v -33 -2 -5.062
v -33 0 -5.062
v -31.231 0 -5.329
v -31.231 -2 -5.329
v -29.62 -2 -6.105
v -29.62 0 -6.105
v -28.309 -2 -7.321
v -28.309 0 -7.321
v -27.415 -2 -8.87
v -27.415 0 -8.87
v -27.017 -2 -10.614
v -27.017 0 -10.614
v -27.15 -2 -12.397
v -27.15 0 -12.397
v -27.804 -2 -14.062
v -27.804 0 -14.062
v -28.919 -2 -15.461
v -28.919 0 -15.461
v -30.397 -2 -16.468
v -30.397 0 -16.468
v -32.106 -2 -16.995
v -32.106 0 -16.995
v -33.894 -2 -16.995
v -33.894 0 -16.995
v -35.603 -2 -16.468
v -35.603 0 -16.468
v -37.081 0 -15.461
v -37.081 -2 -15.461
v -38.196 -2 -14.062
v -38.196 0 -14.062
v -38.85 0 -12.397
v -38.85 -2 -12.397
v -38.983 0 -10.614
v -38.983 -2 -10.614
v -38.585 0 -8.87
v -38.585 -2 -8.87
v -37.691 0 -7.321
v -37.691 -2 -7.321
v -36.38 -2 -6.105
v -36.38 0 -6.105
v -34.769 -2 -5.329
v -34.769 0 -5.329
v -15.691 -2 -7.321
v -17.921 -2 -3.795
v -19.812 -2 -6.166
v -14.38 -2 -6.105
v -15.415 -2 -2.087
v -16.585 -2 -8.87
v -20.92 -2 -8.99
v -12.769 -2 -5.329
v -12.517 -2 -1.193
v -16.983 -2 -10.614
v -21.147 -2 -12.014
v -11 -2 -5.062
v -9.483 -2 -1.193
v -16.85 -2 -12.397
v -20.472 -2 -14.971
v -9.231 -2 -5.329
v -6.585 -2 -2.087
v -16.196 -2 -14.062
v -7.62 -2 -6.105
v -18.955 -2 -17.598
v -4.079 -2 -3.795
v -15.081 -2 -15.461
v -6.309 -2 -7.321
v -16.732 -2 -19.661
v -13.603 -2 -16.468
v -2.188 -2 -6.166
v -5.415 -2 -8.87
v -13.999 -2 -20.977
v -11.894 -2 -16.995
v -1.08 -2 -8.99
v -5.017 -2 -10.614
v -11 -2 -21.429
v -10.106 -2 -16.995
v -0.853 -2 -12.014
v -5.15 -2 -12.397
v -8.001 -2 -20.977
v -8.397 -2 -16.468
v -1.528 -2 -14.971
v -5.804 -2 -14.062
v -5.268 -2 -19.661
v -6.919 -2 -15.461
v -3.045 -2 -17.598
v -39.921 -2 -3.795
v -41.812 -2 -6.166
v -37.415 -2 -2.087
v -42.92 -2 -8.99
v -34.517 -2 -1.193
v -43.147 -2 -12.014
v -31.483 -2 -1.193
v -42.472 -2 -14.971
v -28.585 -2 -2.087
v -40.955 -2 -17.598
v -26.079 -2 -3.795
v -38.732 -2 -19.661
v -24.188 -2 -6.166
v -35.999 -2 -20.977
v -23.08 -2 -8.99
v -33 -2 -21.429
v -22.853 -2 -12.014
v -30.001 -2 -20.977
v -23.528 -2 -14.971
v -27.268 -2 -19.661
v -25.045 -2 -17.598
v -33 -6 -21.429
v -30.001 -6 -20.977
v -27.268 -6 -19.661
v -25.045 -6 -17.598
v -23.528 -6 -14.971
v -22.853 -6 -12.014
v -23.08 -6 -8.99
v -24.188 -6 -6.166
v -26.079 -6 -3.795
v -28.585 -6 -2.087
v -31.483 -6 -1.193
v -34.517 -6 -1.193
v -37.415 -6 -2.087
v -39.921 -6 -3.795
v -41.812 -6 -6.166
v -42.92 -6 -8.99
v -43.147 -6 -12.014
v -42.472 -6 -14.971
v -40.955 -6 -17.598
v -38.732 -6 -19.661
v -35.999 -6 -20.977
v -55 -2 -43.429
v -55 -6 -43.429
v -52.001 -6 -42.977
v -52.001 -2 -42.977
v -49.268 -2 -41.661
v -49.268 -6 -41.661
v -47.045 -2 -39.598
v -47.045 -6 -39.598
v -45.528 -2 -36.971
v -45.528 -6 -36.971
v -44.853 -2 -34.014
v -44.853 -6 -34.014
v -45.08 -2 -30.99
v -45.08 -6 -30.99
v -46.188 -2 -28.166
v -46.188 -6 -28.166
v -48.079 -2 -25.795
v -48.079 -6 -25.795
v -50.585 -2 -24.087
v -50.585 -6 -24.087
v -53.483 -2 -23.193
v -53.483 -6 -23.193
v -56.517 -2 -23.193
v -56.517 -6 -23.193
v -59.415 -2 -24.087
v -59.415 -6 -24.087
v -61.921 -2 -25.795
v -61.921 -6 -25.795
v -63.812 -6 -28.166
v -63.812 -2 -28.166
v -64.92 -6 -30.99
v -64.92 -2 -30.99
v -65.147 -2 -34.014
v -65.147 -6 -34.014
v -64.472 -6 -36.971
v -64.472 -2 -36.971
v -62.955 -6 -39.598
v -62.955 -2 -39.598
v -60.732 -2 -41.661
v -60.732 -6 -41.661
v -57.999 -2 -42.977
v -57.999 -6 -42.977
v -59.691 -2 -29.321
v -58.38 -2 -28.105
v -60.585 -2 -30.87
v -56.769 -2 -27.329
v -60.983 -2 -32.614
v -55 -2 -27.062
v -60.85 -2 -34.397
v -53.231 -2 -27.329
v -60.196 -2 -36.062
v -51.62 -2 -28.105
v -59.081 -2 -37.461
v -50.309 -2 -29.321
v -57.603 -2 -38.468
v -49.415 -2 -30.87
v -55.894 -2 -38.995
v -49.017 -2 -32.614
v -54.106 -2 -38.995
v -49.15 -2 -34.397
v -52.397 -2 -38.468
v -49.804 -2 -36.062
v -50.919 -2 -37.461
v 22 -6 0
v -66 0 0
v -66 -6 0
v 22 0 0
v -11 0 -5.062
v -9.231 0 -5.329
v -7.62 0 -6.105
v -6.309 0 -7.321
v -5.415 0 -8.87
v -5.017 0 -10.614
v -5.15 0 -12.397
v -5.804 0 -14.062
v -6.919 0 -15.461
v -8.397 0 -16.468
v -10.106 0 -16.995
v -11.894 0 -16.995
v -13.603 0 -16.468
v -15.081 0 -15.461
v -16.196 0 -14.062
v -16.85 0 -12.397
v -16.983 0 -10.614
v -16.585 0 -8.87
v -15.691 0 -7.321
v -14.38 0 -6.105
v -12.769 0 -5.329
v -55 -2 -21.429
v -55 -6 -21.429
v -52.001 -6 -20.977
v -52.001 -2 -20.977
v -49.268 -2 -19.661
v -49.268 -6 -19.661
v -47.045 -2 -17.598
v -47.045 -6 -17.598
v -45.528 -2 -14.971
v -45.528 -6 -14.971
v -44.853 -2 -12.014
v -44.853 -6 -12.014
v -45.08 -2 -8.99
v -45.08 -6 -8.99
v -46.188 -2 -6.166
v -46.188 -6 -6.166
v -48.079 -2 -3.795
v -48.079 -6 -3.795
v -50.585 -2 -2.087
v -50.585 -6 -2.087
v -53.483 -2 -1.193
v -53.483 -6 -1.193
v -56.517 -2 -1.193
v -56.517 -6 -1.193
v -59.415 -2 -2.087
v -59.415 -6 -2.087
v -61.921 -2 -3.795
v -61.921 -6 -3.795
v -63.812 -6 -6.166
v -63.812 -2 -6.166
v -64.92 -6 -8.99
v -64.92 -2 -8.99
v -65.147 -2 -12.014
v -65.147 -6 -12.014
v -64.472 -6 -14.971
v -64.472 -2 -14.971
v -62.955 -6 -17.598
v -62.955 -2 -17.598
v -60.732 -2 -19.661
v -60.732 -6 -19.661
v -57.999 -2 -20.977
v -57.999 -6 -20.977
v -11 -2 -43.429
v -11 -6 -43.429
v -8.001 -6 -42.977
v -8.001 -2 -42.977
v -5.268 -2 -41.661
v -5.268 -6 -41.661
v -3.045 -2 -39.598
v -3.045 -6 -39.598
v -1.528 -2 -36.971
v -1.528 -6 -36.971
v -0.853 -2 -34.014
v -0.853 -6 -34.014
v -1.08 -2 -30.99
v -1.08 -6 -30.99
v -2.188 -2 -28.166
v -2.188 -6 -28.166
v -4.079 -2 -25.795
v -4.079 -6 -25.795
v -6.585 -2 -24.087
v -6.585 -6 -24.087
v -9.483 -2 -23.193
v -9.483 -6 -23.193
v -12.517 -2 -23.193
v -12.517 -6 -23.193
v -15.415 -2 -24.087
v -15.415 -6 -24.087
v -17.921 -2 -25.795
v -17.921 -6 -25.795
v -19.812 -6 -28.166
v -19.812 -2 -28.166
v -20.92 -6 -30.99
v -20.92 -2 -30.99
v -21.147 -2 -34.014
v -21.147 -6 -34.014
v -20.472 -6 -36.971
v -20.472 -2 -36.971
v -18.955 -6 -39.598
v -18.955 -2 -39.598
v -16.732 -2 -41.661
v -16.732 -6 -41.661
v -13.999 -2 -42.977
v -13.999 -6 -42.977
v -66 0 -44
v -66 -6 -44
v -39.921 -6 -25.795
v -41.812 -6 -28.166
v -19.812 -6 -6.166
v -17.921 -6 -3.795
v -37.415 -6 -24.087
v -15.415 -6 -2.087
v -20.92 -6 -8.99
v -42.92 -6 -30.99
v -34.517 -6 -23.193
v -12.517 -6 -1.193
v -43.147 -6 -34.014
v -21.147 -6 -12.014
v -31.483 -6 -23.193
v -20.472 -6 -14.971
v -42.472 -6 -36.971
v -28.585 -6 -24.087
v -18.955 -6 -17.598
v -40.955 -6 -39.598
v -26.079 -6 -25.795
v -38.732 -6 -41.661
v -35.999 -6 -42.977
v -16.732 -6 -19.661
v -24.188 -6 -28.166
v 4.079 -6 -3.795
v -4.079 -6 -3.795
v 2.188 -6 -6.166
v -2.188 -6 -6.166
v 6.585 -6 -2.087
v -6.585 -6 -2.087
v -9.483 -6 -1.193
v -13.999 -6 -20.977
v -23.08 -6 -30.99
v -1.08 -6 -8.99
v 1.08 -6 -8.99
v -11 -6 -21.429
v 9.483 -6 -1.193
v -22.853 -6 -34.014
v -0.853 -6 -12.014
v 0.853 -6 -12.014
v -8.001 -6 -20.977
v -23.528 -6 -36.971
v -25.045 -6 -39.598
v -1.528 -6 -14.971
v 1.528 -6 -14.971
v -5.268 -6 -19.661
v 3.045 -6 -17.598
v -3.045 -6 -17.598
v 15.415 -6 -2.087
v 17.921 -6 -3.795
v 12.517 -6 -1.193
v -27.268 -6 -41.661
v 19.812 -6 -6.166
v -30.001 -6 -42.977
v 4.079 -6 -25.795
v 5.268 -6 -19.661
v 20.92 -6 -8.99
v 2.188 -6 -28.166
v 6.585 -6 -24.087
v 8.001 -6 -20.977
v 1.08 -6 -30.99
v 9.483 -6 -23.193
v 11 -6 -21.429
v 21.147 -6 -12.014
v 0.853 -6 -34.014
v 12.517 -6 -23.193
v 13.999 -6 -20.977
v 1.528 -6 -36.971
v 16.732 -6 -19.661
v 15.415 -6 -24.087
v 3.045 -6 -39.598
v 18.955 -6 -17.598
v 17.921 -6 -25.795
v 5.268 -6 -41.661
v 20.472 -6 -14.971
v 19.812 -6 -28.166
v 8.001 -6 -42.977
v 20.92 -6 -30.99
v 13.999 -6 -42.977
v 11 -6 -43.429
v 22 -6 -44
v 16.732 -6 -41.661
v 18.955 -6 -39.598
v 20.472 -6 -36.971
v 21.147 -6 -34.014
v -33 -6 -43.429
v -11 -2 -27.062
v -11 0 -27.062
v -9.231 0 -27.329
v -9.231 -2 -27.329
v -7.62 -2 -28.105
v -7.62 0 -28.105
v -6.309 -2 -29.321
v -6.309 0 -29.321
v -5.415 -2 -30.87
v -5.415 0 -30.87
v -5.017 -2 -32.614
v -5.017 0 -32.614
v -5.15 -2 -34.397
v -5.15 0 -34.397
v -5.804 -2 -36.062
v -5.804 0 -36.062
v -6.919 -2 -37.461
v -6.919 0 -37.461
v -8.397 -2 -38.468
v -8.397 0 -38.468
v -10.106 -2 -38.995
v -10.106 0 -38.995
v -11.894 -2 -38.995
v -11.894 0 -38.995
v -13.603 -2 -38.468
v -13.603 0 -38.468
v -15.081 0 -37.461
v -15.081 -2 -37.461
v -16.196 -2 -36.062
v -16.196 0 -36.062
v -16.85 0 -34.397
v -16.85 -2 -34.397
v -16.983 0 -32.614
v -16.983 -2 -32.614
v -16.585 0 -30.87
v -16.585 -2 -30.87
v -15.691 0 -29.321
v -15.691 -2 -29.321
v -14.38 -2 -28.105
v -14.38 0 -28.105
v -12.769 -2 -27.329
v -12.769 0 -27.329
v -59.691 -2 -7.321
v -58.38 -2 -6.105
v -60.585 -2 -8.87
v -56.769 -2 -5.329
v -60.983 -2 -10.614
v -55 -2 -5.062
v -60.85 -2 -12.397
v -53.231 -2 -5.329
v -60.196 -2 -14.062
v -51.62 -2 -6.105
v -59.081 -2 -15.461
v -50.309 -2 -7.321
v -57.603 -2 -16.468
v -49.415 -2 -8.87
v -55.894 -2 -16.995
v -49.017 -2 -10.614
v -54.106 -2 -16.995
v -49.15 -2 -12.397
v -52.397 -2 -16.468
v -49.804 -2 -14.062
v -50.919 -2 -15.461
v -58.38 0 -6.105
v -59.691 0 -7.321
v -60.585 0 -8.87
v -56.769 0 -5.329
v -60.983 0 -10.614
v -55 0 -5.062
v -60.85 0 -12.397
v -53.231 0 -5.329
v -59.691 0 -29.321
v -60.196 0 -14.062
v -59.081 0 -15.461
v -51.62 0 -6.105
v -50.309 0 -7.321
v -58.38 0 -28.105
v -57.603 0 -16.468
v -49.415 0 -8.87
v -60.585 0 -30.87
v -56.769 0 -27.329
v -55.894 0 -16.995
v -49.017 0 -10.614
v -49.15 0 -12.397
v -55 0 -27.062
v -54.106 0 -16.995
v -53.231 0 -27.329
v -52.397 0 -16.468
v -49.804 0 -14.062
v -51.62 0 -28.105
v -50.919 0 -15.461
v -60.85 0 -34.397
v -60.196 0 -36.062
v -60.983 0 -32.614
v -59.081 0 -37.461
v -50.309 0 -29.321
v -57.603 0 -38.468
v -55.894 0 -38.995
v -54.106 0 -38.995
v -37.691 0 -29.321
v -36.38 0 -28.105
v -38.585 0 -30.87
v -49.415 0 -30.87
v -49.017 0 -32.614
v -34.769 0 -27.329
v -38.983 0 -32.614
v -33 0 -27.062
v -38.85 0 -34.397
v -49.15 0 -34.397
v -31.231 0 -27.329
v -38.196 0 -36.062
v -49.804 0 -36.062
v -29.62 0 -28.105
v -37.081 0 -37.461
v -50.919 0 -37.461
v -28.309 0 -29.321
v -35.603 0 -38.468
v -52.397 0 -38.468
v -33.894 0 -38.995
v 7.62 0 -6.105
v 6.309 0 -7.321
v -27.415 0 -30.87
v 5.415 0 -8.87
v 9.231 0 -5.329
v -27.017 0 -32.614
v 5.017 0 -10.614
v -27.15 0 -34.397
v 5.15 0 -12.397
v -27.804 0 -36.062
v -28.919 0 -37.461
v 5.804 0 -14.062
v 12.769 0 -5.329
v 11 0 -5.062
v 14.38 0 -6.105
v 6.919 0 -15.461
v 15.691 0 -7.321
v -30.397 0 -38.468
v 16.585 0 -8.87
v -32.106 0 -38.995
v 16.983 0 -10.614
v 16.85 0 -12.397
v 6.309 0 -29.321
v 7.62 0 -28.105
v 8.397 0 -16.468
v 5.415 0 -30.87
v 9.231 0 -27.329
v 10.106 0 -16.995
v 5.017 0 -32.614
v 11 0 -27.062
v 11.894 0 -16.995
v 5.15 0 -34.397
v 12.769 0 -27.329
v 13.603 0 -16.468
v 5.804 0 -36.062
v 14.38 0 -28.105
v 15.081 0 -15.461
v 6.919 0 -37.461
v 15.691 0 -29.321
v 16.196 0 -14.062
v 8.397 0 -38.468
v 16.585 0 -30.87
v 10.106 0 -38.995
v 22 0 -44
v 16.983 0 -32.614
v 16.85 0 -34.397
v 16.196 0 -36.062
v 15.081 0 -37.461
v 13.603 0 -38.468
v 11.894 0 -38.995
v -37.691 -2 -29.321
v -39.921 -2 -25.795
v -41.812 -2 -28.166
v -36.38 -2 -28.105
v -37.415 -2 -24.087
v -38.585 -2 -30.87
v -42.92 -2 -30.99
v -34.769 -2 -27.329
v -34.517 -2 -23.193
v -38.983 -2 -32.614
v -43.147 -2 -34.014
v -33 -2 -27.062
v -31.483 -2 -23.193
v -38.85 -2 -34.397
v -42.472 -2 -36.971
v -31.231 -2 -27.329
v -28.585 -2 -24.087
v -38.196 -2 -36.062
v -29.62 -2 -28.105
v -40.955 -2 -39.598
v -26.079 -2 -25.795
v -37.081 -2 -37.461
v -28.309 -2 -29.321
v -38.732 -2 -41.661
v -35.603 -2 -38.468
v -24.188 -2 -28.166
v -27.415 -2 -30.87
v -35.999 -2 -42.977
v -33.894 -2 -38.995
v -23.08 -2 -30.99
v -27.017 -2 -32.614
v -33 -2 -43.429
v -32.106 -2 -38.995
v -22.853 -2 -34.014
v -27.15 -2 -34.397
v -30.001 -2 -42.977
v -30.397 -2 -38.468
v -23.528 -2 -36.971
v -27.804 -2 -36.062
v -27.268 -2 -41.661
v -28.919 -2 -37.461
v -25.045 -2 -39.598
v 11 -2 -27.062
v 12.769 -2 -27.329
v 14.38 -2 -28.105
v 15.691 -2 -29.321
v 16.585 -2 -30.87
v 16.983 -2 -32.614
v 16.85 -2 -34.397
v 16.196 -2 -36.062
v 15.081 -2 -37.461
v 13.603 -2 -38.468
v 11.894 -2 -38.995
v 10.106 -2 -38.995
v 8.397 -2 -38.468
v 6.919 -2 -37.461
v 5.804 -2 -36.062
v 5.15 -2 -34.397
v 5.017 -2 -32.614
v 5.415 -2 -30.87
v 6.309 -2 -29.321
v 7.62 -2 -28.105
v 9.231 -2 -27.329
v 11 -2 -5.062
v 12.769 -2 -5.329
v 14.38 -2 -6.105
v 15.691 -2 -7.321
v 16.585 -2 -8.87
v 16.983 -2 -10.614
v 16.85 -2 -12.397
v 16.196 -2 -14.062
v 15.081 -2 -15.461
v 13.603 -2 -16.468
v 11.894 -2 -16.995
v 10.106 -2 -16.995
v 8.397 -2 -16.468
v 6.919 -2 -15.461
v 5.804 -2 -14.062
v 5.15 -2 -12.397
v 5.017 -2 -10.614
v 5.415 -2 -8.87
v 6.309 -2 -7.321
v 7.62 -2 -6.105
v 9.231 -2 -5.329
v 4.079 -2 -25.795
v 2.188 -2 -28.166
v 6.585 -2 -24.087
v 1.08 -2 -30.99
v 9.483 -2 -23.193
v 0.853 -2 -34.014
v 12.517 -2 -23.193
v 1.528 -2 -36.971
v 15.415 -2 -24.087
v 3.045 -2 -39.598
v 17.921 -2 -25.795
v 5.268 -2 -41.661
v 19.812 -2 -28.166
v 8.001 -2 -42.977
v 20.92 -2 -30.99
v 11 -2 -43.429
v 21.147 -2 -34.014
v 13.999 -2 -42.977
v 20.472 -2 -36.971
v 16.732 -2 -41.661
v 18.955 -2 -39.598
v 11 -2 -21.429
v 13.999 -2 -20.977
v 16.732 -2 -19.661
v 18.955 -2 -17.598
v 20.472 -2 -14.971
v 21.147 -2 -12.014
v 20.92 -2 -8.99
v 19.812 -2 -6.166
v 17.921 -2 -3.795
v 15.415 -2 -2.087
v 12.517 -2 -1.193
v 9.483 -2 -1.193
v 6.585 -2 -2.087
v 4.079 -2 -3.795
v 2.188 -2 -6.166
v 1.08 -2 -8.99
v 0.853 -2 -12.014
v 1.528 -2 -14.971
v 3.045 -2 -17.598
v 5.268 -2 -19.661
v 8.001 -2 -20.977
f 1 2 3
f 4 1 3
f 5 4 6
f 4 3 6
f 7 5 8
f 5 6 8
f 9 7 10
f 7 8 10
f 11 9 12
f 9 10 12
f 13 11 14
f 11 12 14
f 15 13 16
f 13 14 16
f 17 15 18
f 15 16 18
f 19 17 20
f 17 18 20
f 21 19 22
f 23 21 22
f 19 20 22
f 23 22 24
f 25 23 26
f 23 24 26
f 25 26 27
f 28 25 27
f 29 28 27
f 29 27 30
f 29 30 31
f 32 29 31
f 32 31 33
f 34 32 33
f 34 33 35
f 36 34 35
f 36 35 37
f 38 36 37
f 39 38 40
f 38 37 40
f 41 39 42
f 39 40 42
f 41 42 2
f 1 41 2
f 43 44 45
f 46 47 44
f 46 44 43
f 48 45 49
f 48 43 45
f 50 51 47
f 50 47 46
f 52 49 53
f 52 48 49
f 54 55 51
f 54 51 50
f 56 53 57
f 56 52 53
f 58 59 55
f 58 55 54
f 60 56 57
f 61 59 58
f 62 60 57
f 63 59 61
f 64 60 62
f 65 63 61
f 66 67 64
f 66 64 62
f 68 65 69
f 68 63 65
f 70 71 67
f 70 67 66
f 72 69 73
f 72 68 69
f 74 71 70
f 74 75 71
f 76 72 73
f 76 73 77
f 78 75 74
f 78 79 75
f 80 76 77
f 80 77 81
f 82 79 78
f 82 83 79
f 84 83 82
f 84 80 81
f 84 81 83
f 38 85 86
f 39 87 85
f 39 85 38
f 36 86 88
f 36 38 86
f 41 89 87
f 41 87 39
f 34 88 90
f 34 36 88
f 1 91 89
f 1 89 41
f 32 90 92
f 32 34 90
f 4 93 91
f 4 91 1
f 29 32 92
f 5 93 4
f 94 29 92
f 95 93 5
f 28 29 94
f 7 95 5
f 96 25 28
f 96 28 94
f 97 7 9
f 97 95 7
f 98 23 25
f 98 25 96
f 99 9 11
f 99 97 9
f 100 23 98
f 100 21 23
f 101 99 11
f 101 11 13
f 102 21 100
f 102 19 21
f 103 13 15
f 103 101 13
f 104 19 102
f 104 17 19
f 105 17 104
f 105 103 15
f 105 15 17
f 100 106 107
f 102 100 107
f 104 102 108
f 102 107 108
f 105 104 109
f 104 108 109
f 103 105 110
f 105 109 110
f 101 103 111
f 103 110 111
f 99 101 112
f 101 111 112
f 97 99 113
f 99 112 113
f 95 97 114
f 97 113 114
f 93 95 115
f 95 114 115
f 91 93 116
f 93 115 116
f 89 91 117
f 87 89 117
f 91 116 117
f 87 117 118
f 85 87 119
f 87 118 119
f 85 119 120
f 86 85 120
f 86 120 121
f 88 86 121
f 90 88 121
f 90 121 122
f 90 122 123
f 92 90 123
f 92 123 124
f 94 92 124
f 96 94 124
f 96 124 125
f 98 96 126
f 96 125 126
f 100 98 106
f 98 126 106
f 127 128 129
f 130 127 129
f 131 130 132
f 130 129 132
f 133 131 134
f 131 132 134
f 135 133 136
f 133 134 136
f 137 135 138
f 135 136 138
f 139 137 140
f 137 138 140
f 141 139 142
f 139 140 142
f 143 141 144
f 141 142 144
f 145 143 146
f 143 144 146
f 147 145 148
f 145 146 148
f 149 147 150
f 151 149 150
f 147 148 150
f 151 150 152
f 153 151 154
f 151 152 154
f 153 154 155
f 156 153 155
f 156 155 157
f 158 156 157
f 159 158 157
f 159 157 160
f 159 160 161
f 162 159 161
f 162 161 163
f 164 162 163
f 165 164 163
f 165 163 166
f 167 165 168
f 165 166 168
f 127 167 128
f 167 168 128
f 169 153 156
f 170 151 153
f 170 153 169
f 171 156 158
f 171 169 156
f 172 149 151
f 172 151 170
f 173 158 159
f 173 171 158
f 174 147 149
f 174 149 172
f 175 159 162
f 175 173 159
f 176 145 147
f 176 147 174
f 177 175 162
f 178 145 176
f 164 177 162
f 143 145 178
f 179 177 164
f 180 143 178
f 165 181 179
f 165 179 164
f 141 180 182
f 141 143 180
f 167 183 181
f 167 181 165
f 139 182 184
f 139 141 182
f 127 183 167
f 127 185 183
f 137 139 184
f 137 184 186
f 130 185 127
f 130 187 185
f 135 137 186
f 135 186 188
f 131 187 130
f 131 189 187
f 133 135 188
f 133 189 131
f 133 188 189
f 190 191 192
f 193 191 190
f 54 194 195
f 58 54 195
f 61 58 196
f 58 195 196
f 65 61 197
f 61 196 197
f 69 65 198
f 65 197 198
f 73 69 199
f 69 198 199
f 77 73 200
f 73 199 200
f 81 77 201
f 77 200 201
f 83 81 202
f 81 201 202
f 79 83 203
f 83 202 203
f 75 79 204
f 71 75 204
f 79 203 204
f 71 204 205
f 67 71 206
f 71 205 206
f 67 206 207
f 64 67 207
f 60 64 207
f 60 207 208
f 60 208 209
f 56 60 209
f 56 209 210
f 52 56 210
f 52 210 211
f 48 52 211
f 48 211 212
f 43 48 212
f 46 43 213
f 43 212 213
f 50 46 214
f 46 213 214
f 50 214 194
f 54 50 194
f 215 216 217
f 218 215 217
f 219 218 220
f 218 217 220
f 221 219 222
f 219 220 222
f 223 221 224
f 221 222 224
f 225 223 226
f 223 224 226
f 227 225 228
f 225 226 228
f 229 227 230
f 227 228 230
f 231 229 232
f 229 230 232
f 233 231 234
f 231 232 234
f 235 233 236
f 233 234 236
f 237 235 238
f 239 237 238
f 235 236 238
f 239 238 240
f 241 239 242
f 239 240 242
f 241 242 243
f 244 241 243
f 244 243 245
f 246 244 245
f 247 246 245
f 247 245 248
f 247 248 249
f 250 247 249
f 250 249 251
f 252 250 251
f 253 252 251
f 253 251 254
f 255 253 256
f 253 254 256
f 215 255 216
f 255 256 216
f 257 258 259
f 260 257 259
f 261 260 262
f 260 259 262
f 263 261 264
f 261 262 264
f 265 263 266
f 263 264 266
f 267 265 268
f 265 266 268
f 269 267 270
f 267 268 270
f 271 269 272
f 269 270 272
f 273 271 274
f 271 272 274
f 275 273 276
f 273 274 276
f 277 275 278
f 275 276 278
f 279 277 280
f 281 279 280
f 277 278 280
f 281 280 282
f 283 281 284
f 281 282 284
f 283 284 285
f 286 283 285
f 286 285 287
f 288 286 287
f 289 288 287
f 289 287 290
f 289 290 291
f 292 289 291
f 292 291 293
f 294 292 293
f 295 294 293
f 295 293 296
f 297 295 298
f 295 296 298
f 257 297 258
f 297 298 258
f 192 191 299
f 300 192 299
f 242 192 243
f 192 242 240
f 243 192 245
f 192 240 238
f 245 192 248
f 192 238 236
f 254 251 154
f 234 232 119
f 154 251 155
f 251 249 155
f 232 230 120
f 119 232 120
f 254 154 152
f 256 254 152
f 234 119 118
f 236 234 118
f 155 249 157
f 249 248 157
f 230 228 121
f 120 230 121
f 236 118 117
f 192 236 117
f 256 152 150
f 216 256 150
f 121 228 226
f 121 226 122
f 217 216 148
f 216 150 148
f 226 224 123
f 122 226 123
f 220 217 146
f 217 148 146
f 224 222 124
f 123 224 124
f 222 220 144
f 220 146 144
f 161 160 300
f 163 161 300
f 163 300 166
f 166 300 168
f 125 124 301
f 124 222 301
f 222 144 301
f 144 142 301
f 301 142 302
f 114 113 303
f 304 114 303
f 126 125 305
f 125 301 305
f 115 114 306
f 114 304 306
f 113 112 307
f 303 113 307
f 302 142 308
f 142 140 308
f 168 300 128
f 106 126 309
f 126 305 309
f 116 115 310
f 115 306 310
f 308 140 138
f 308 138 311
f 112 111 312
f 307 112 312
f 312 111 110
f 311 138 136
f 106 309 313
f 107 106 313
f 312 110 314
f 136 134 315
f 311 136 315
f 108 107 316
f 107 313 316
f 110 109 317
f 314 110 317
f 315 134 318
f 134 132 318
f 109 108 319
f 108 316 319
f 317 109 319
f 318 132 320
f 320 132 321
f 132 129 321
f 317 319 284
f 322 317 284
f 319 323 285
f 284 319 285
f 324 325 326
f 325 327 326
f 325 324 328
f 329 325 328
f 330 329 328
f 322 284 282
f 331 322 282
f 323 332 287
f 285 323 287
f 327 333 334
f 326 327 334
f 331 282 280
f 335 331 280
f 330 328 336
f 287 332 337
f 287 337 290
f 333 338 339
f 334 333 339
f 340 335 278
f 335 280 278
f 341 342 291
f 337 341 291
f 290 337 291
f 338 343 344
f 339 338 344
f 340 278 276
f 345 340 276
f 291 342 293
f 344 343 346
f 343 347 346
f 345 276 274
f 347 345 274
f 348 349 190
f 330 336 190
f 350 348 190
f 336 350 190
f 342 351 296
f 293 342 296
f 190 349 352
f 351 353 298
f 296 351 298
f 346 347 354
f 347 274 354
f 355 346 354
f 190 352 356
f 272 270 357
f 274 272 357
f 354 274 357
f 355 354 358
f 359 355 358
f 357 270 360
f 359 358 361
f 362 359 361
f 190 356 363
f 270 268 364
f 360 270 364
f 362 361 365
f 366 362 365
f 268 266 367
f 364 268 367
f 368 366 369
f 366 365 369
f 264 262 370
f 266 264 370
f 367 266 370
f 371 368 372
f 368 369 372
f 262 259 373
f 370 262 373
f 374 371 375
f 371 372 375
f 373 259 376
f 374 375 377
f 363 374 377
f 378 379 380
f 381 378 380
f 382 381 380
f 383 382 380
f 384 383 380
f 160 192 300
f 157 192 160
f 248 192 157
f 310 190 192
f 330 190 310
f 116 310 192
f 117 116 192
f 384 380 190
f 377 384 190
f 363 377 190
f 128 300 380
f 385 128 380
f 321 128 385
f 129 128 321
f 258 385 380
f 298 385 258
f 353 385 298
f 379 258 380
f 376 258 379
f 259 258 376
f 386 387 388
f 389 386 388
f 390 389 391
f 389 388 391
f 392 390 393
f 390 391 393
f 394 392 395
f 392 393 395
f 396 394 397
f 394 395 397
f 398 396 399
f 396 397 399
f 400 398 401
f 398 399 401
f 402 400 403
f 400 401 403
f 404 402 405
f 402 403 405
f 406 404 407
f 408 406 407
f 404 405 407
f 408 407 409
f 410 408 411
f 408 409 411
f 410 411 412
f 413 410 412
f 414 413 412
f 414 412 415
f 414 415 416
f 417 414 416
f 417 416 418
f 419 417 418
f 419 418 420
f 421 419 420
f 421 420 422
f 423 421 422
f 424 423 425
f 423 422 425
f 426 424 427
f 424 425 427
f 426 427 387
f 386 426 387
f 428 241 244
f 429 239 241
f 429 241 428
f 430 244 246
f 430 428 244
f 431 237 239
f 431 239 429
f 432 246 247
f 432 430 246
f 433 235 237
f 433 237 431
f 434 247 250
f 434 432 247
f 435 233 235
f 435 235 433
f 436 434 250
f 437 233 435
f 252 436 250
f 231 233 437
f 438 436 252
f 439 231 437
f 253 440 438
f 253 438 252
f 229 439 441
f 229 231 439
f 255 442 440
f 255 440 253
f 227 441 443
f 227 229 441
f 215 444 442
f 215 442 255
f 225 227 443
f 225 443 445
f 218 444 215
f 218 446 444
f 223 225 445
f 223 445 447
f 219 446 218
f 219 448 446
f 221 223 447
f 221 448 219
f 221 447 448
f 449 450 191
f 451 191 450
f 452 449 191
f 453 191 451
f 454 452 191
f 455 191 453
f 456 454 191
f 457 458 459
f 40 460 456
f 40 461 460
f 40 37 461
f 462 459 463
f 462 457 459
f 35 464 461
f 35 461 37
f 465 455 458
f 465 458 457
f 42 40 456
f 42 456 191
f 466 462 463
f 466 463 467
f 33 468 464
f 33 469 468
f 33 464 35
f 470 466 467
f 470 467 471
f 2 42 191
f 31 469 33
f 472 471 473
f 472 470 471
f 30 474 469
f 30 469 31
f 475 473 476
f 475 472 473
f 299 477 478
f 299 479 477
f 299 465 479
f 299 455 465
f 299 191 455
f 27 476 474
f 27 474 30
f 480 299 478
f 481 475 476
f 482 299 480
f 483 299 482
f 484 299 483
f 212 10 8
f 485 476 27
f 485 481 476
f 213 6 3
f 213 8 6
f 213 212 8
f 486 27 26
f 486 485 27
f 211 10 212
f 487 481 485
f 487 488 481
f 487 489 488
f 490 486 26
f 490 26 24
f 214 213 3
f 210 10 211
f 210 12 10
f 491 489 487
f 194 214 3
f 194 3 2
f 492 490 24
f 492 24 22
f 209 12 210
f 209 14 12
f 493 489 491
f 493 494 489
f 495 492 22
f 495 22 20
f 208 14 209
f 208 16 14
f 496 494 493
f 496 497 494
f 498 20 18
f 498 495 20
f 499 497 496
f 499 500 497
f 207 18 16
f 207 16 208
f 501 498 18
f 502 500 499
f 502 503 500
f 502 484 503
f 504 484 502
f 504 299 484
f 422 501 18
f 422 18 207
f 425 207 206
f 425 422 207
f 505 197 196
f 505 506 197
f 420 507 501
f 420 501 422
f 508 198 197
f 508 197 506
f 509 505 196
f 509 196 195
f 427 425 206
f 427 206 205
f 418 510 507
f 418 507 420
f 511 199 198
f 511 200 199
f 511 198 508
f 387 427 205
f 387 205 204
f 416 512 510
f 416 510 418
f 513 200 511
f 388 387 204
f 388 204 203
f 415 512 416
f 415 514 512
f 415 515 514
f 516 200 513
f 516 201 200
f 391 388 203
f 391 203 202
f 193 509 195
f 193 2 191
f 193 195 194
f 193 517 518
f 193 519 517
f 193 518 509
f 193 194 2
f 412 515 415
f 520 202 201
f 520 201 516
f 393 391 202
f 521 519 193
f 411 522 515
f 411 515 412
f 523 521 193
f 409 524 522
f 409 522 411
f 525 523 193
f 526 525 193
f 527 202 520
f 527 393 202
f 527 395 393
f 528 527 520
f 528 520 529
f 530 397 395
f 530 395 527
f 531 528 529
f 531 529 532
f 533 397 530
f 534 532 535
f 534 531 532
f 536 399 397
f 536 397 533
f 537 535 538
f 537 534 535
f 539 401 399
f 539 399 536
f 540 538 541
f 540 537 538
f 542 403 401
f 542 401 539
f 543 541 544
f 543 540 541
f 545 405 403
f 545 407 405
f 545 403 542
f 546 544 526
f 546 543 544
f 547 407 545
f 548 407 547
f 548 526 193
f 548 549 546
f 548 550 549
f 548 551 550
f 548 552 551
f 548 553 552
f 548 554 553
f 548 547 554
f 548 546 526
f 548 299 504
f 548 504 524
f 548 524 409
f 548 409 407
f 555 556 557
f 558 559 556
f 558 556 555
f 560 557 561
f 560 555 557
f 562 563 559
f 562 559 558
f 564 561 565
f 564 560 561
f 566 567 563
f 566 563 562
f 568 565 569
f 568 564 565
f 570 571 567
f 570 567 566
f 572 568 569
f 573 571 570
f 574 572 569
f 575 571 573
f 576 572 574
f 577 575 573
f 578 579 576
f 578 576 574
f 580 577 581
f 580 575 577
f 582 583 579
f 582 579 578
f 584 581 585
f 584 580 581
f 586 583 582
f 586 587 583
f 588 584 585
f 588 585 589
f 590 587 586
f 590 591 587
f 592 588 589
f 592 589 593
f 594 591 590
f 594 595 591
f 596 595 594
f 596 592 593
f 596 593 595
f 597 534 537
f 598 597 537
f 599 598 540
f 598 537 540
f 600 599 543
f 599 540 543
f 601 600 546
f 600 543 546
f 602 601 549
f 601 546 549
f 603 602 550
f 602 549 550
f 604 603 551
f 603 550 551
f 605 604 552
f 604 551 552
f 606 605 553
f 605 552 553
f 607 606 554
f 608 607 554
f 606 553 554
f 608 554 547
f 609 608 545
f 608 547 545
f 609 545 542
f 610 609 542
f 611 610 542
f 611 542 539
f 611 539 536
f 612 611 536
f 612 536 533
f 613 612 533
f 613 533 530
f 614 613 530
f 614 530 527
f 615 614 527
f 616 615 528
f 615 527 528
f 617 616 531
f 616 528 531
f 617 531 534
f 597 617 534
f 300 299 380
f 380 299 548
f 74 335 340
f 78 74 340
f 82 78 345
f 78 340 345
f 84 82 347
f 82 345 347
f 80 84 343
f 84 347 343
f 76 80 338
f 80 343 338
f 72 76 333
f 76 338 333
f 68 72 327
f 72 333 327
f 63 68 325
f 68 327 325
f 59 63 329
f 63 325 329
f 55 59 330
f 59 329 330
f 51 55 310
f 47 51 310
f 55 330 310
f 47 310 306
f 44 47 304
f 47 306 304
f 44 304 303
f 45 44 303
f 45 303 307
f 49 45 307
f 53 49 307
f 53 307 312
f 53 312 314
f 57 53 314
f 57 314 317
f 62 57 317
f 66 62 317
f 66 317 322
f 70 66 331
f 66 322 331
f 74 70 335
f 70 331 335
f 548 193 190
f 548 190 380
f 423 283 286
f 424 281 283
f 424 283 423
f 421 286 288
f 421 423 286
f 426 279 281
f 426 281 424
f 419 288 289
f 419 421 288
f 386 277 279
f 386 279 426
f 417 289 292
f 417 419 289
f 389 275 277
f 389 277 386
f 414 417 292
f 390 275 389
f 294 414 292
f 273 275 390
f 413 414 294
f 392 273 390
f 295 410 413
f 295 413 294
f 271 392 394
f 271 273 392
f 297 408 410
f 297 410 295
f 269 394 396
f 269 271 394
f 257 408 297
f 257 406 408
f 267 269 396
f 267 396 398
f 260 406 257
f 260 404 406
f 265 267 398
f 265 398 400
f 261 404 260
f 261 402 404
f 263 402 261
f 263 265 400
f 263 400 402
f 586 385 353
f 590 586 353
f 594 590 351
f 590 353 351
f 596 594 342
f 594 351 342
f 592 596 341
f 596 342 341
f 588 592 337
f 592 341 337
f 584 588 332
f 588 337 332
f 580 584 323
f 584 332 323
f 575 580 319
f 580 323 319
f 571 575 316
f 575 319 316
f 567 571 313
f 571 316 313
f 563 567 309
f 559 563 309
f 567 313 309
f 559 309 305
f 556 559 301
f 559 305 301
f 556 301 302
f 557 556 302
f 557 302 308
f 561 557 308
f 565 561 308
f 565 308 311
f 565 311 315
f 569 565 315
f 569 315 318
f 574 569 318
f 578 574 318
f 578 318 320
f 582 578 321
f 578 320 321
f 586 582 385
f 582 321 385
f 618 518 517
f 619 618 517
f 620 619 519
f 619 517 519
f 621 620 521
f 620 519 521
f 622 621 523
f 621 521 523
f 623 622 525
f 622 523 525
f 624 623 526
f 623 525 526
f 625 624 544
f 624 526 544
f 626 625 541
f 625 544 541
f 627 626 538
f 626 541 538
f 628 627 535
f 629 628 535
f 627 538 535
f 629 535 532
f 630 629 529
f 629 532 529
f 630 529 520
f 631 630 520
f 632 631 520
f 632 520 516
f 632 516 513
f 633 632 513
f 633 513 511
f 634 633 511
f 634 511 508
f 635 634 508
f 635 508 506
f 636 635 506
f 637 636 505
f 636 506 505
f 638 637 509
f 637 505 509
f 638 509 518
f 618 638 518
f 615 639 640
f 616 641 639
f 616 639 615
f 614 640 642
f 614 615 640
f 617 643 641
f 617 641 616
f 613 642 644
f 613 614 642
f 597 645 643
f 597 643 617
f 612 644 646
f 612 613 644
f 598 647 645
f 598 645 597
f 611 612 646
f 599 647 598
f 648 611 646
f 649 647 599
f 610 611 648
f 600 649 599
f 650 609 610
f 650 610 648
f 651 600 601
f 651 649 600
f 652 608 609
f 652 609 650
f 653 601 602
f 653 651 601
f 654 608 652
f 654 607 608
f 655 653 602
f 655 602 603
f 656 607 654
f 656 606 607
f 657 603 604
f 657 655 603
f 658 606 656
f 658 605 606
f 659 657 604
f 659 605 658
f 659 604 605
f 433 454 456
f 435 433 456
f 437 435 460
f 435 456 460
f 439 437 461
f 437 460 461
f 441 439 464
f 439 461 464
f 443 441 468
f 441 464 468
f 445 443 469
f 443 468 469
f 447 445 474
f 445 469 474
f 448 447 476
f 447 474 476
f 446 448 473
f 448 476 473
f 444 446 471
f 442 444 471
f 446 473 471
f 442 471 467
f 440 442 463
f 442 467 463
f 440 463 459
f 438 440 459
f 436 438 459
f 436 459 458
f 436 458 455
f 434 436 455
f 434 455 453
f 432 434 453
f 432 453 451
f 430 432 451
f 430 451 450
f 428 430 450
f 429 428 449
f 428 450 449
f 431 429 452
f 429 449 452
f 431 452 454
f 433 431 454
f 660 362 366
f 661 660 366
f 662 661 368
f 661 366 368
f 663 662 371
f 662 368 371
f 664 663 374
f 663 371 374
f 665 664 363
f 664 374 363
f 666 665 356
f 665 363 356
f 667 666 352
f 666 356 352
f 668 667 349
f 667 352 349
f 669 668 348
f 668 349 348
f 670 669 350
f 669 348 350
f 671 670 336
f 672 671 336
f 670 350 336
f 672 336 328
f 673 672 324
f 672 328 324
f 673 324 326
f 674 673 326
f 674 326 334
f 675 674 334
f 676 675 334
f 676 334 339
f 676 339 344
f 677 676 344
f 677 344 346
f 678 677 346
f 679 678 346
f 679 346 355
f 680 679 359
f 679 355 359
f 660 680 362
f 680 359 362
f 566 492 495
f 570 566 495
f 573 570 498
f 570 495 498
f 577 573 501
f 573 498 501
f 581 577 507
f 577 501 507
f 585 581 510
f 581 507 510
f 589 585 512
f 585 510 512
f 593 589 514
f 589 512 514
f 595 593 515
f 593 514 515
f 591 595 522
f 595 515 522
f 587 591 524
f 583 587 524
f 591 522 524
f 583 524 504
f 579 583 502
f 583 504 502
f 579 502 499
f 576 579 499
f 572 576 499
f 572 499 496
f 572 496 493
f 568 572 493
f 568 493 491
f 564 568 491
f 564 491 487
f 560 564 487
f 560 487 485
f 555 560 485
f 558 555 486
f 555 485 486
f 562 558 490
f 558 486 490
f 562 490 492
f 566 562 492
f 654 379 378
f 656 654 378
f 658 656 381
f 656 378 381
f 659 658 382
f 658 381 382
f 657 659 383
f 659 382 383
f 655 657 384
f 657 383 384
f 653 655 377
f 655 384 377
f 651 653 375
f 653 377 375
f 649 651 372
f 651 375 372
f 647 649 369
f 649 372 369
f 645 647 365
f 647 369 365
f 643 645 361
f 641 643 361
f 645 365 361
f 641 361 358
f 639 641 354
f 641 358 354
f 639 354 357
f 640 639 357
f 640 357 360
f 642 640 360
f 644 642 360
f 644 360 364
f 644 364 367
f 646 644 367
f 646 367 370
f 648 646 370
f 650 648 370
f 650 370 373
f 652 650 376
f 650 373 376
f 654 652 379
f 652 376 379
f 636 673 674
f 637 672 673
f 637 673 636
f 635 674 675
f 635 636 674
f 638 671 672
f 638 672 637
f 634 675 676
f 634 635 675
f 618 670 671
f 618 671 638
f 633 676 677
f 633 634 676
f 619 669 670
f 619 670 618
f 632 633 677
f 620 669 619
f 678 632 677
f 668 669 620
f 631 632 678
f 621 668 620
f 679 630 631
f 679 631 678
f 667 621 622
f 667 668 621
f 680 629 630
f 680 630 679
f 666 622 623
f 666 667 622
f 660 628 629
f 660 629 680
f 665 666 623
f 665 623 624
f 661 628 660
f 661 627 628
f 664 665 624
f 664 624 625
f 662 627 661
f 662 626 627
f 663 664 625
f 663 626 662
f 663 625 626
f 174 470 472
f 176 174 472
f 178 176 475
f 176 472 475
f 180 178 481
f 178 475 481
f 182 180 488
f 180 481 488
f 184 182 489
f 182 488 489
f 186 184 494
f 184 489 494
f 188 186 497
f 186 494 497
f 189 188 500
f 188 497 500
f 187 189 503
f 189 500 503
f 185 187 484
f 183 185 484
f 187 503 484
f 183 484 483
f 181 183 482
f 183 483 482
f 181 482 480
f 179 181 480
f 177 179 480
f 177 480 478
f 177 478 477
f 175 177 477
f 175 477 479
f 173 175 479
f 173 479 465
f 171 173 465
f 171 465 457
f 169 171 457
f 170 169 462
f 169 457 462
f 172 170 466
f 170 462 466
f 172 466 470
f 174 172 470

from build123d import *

# Parameters (mm, degrees)
SKETCH2_W                 = 22
SKETCH2_H                 = 22
BOSS_EXTRUDE1_DEPTH       = 6
SKETCH3_R                 = 6
CUT_EXTRUDE1_DEPTH        = 2
SKETCH4_R                 = 10.175
CUT_EXTRUDE2_DEPTH        = 4
LPATTERN1_COUNT           = 4
LPATTERN1_PITCH           = 22
LPATTERN2_COUNT           = 2
LPATTERN2_PITCH           = 22
LPATTERN2_COPY_1_SKETCH_W = 22
LPATTERN2_COPY_1_SKETCH_H = 22
LPATTERN2_COPY_1_DEPTH    = 6
LPATTERN2_COPY_2_SKETCH_W = 22
LPATTERN2_COPY_2_SKETCH_H = 22
LPATTERN2_COPY_2_DEPTH    = 6
LPATTERN2_COPY_3_SKETCH_W = 22
LPATTERN2_COPY_3_SKETCH_H = 22
LPATTERN2_COPY_3_DEPTH    = 6
LPATTERN2_COPY_4_SKETCH_R = 6
LPATTERN2_COPY_4_DEPTH    = 2
LPATTERN2_COPY_5_SKETCH_R = 6
LPATTERN2_COPY_5_DEPTH    = 2
LPATTERN2_COPY_6_SKETCH_R = 6
LPATTERN2_COPY_6_DEPTH    = 2
LPATTERN2_COPY_7_SKETCH_R = 10.175
LPATTERN2_COPY_7_DEPTH    = 4
LPATTERN2_COPY_8_SKETCH_R = 10.175
LPATTERN2_COPY_8_DEPTH    = 4
LPATTERN2_COPY_9_SKETCH_R = 10.175
LPATTERN2_COPY_9_DEPTH    = 4


with BuildPart() as part:
    # Sketch2 → Boss-Extrude1 (new body)
    with BuildSketch(Plane(origin=(0, 0, 0), x_dir=(1, 0, 0), z_dir=(0, 1, 0))):
        with Locations((11, 11)):
            Rectangle(SKETCH2_W, SKETCH2_H)
    boss_extrude1 = extrude(amount=-BOSS_EXTRUDE1_DEPTH)

    # Sketch3 → Cut-Extrude1 (cut)
    with BuildSketch(Plane(origin=(0, 0, 0), x_dir=(1, 0, 0), z_dir=(0, 1, 0))):
        with Locations(Location((11, 11.062224767, 0), (0, 0, 270))):
            Circle(SKETCH3_R)
    cut_extrude1 = extrude(amount=-CUT_EXTRUDE1_DEPTH, mode=Mode.SUBTRACT)

    # Sketch4 → Cut-Extrude2 (cut)
    with BuildSketch(Plane.XZ.offset(6)):
        with Locations(Location((11, -11.253914961, 0), (0, 0, 270))):
            Circle(SKETCH4_R)
    cut_extrude2 = extrude(amount=-CUT_EXTRUDE2_DEPTH, mode=Mode.SUBTRACT)

    # LPattern1: Boss-Extrude1, Cut-Extrude1, Cut-Extrude2 ×4
    with Locations(*[(-i * LPATTERN1_PITCH, 0, 0) for i in range(1, LPATTERN1_COUNT)]):
        add(boss_extrude1)
        add(cut_extrude1, mode=Mode.SUBTRACT)
        add(cut_extrude2, mode=Mode.SUBTRACT)

    # LPattern2: Boss-Extrude1, Cut-Extrude1, Cut-Extrude2 ×2
    with Locations(*[(0, 0, -i * LPATTERN2_PITCH) for i in range(1, LPATTERN2_COUNT)]):
        add(boss_extrude1)
        add(cut_extrude1, mode=Mode.SUBTRACT)
        add(cut_extrude2, mode=Mode.SUBTRACT)

    # LPattern2 copy 1 sketch → LPattern2 copy 1 (add)
    with BuildSketch(Plane(origin=(-22, 0, -22), x_dir=(1, 0, 0), z_dir=(0, 1, 0))):
        with Locations((11, 11)):
            Rectangle(LPATTERN2_COPY_1_SKETCH_W, LPATTERN2_COPY_1_SKETCH_H)
    extrude(amount=-LPATTERN2_COPY_1_DEPTH)

    # LPattern2 copy 2 sketch → LPattern2 copy 2 (add)
    with BuildSketch(Plane(origin=(-44, 0, -22), x_dir=(1, 0, 0), z_dir=(0, 1, 0))):
        with Locations((11, 11)):
            Rectangle(LPATTERN2_COPY_2_SKETCH_W, LPATTERN2_COPY_2_SKETCH_H)
    extrude(amount=-LPATTERN2_COPY_2_DEPTH)

    # LPattern2 copy 3 sketch → LPattern2 copy 3 (add)
    with BuildSketch(Plane(origin=(-66, 0, -22), x_dir=(1, 0, 0), z_dir=(0, 1, 0))):
        with Locations((11, 11)):
            Rectangle(LPATTERN2_COPY_3_SKETCH_W, LPATTERN2_COPY_3_SKETCH_H)
    extrude(amount=-LPATTERN2_COPY_3_DEPTH)

    # LPattern2 copy 4 sketch → LPattern2 copy 4 (cut)
    with BuildSketch(Plane(origin=(-22, 0, -22), x_dir=(1, 0, 0), z_dir=(0, 1, 0))):
        with Locations(Location((11, 11.062224767, 0), (0, 0, 270))):
            Circle(LPATTERN2_COPY_4_SKETCH_R)
    extrude(amount=-LPATTERN2_COPY_4_DEPTH, mode=Mode.SUBTRACT)

    # LPattern2 copy 5 sketch → LPattern2 copy 5 (cut)
    with BuildSketch(Plane(origin=(-44, 0, -22), x_dir=(1, 0, 0), z_dir=(0, 1, 0))):
        with Locations(Location((11, 11.062224767, 0), (0, 0, 270))):
            Circle(LPATTERN2_COPY_5_SKETCH_R)
    extrude(amount=-LPATTERN2_COPY_5_DEPTH, mode=Mode.SUBTRACT)

    # LPattern2 copy 6 sketch → LPattern2 copy 6 (cut)
    with BuildSketch(Plane(origin=(-66, 0, -22), x_dir=(1, 0, 0), z_dir=(0, 1, 0))):
        with Locations(Location((11, 11.062224767, 0), (0, 0, 270))):
            Circle(LPATTERN2_COPY_6_SKETCH_R)
    extrude(amount=-LPATTERN2_COPY_6_DEPTH, mode=Mode.SUBTRACT)

    # LPattern2 copy 7 sketch → LPattern2 copy 7 (cut)
    with BuildSketch(Plane(origin=(-22, -6, -22), x_dir=(1, 0, 0), z_dir=(0, -1, 0))):
        with Locations(Location((11, -11.253914961, 0), (0, 0, 270))):
            Circle(LPATTERN2_COPY_7_SKETCH_R)
    extrude(amount=-LPATTERN2_COPY_7_DEPTH, mode=Mode.SUBTRACT)

    # LPattern2 copy 8 sketch → LPattern2 copy 8 (cut)
    with BuildSketch(Plane(origin=(-44, -6, -22), x_dir=(1, 0, 0), z_dir=(0, -1, 0))):
        with Locations(Location((11, -11.253914961, 0), (0, 0, 270))):
            Circle(LPATTERN2_COPY_8_SKETCH_R)
    extrude(amount=-LPATTERN2_COPY_8_DEPTH, mode=Mode.SUBTRACT)

    # LPattern2 copy 9 sketch → LPattern2 copy 9 (cut)
    with BuildSketch(Plane(origin=(-66, -6, -22), x_dir=(1, 0, 0), z_dir=(0, -1, 0))):
        with Locations(Location((11, -11.253914961, 0), (0, 0, 270))):
            Circle(LPATTERN2_COPY_9_SKETCH_R)
    extrude(amount=-LPATTERN2_COPY_9_DEPTH, mode=Mode.SUBTRACT)


solid = part.part
